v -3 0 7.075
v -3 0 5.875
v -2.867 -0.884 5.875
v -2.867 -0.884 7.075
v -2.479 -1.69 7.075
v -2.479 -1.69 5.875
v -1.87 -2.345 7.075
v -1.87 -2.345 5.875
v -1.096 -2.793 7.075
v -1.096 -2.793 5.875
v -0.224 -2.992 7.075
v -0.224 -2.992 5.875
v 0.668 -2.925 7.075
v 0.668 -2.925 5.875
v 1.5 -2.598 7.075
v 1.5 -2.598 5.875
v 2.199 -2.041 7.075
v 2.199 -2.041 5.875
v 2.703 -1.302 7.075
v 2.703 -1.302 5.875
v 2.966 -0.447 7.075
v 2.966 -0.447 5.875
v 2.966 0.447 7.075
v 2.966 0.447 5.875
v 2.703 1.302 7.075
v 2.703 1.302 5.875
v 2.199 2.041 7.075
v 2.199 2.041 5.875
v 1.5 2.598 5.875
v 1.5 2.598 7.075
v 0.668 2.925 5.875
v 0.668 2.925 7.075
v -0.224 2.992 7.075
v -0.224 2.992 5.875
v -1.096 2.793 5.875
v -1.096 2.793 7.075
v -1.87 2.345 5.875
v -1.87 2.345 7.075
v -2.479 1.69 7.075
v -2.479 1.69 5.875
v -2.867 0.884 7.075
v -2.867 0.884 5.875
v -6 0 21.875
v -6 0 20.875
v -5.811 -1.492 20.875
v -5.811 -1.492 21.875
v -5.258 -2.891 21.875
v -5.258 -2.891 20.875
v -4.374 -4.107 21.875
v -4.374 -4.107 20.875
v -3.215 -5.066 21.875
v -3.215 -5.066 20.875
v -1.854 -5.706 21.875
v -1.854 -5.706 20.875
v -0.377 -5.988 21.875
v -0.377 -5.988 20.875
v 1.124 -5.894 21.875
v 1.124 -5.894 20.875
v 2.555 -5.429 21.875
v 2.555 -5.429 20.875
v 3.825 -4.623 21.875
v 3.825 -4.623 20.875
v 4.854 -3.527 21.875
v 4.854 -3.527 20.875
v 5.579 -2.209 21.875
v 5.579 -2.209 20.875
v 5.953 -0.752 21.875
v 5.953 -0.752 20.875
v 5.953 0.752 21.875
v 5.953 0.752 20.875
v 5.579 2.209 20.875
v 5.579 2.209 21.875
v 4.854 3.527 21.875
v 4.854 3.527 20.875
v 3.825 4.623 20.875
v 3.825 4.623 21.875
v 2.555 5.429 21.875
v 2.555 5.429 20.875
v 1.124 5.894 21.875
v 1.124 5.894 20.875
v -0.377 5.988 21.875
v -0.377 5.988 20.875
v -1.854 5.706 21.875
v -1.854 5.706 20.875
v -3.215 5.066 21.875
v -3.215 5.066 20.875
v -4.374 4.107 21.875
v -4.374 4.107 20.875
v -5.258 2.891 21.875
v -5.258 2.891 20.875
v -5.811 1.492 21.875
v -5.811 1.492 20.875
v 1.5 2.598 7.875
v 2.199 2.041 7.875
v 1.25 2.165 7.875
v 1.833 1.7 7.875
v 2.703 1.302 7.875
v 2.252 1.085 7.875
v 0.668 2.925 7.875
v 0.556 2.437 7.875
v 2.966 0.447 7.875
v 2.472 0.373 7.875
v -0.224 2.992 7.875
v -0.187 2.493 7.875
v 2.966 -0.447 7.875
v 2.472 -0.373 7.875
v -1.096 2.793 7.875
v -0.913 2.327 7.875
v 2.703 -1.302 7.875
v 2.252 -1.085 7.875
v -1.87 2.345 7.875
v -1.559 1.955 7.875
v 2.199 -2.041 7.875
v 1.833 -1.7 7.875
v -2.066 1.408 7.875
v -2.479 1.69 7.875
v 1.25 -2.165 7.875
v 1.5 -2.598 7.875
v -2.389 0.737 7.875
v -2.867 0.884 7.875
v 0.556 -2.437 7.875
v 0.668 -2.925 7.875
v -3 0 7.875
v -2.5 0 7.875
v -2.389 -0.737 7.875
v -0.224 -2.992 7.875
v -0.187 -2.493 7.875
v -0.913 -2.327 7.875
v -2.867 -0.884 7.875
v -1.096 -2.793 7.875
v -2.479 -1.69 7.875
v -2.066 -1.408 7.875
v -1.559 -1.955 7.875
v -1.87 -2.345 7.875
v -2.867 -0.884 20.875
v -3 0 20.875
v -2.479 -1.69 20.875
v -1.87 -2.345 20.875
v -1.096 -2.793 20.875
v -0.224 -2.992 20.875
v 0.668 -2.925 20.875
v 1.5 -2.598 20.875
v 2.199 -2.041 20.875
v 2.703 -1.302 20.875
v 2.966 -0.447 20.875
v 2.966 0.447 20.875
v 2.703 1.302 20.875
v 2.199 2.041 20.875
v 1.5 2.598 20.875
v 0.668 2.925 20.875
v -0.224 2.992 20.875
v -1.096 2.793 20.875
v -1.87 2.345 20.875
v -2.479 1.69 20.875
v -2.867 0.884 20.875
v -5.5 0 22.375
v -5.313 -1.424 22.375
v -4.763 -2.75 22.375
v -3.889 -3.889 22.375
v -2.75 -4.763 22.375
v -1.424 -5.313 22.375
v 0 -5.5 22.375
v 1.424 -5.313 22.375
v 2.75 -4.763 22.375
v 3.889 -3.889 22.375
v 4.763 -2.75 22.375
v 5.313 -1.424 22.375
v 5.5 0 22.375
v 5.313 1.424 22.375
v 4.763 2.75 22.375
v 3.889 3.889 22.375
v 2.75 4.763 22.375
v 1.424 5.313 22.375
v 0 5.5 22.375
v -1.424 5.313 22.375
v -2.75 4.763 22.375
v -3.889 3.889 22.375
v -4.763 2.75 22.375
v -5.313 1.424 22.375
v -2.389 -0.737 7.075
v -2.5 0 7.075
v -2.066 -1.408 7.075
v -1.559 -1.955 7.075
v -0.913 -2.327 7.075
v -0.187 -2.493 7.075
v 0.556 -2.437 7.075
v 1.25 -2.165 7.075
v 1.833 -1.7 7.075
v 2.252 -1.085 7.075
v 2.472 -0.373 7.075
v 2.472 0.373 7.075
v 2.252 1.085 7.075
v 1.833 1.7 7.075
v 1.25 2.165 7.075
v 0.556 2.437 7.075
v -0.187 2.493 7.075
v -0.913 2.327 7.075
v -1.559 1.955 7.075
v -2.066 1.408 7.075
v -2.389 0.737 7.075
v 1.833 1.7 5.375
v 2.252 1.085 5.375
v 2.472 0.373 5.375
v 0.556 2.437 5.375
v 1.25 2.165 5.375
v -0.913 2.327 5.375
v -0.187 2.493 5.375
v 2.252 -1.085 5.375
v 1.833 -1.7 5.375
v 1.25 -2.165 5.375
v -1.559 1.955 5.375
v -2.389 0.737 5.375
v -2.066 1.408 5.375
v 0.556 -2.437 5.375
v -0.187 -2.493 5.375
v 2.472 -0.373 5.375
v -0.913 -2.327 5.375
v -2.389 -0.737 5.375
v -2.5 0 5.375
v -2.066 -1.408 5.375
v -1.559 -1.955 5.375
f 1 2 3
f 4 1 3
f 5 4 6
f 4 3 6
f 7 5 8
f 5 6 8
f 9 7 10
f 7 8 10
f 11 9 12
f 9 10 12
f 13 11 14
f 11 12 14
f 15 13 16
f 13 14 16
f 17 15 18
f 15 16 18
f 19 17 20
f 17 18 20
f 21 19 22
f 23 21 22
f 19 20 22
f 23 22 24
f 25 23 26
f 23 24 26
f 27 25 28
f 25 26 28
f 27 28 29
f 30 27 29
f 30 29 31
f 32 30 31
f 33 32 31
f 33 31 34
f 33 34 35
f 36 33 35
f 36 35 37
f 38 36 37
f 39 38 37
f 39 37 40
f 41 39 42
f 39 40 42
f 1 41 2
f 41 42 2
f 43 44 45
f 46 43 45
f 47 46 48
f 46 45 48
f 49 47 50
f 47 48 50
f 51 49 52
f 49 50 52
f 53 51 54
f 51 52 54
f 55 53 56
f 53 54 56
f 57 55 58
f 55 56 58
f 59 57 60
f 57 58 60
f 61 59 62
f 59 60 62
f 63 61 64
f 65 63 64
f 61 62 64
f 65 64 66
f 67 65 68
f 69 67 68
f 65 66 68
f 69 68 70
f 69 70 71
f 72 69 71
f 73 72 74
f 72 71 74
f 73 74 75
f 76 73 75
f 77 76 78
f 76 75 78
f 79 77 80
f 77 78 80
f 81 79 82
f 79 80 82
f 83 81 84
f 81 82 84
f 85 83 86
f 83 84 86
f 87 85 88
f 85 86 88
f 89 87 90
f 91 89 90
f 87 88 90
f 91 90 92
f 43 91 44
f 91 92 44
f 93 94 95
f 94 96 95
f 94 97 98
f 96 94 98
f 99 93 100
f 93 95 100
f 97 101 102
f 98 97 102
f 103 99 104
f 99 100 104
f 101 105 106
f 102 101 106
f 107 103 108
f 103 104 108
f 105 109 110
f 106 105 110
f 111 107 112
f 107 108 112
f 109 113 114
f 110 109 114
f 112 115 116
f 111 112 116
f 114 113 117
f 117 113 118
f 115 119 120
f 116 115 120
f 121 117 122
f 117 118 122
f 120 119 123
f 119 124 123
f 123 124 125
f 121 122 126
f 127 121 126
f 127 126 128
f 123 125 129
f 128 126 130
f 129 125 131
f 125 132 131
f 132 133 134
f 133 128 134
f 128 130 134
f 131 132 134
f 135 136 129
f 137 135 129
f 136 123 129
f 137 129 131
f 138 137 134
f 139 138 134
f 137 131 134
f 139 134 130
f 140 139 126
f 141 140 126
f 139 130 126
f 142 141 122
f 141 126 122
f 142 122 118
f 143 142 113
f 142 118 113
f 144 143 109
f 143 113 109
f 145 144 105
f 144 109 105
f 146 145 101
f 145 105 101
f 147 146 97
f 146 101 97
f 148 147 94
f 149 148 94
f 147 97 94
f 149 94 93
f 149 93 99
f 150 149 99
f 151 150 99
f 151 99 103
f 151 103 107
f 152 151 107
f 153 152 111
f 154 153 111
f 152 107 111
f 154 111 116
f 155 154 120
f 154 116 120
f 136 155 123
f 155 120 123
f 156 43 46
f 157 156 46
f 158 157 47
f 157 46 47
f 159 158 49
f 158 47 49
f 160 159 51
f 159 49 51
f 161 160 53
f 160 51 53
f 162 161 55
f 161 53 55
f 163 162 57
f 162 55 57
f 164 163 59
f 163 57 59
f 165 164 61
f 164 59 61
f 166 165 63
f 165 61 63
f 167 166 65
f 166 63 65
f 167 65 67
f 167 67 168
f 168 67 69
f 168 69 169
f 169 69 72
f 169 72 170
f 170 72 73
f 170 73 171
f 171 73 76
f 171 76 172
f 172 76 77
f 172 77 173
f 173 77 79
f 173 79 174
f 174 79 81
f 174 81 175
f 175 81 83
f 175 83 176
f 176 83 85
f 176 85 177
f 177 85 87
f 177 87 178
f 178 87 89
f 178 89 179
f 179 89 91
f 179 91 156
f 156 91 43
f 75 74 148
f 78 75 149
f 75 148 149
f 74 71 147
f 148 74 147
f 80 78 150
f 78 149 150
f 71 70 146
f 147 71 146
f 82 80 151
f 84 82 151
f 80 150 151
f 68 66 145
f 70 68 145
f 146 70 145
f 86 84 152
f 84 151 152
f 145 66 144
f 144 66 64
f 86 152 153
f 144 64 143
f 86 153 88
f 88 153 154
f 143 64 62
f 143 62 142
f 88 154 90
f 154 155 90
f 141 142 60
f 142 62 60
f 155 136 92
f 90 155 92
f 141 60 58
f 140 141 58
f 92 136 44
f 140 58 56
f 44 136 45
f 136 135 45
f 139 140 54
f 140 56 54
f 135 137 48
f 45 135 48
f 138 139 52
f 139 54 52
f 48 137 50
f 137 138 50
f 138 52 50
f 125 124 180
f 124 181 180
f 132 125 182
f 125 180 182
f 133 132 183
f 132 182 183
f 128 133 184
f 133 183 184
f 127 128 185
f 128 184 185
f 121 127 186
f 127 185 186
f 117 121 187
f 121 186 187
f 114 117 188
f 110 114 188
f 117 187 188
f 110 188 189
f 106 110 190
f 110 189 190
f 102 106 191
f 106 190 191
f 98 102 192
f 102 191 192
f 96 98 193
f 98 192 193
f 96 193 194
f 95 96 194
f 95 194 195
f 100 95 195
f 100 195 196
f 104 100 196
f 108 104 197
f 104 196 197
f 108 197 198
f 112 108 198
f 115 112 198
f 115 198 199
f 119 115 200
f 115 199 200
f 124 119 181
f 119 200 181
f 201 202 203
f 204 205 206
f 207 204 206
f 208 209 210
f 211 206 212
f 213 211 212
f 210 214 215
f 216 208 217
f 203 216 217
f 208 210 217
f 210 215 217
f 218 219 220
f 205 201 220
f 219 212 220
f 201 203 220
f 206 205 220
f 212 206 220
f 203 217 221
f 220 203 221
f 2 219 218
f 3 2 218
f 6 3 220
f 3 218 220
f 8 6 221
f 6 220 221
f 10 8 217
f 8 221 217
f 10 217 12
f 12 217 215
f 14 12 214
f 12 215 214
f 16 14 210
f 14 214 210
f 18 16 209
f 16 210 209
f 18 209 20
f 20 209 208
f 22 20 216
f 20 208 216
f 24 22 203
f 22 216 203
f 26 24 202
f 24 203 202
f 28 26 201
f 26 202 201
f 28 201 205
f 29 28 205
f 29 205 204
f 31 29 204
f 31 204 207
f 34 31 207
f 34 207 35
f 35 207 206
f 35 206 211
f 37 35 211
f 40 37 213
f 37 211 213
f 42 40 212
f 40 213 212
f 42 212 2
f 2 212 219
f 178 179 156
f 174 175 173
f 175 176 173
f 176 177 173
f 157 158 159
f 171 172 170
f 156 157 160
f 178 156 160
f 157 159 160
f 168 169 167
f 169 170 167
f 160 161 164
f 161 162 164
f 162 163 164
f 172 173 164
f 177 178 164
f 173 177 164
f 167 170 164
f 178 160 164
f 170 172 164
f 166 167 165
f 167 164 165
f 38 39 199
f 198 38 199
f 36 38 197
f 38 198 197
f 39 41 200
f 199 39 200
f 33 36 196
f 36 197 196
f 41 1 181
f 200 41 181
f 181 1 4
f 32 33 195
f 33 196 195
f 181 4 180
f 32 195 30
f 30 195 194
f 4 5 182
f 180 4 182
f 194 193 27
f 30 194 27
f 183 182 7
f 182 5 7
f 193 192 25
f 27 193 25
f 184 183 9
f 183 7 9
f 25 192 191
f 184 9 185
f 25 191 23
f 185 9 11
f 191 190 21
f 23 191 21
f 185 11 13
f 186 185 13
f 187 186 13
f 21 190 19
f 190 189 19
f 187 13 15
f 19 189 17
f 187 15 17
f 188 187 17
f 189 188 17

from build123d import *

# Parameters (mm, degrees)
CHAMFER1_SIZE = 0.5


with BuildPart() as part:
    # Sketch1 → Revolve1 (revolve)
    with BuildSketch(Plane(origin=(0, 0, 0), x_dir=(1, 0, 0), z_dir=(0, 1, 0))):
        Polygon((0, -22.374712644), (-6, -22.374712644), (-6, -20.874712644), (-3, -20.874712644), (-3, -7.874712644), (-2.5, -7.874712644), (-2.5, -7.074712644), (-3, -7.074712644), (-3, -5.374712644), (0, -5.374712644), align=None)
    revolve(axis=Axis((0, 0, -21.276149425), (0, 0, 1)))

    # Chamfer1
    chamfer1_edges = [part.edges().sort_by_distance(p)[0] for p in [
        (3, 0, 5.374712644),
        (6, 0, 22.374712644),
    ]]
    chamfer(chamfer1_edges, length=CHAMFER1_SIZE)


solid = part.part
